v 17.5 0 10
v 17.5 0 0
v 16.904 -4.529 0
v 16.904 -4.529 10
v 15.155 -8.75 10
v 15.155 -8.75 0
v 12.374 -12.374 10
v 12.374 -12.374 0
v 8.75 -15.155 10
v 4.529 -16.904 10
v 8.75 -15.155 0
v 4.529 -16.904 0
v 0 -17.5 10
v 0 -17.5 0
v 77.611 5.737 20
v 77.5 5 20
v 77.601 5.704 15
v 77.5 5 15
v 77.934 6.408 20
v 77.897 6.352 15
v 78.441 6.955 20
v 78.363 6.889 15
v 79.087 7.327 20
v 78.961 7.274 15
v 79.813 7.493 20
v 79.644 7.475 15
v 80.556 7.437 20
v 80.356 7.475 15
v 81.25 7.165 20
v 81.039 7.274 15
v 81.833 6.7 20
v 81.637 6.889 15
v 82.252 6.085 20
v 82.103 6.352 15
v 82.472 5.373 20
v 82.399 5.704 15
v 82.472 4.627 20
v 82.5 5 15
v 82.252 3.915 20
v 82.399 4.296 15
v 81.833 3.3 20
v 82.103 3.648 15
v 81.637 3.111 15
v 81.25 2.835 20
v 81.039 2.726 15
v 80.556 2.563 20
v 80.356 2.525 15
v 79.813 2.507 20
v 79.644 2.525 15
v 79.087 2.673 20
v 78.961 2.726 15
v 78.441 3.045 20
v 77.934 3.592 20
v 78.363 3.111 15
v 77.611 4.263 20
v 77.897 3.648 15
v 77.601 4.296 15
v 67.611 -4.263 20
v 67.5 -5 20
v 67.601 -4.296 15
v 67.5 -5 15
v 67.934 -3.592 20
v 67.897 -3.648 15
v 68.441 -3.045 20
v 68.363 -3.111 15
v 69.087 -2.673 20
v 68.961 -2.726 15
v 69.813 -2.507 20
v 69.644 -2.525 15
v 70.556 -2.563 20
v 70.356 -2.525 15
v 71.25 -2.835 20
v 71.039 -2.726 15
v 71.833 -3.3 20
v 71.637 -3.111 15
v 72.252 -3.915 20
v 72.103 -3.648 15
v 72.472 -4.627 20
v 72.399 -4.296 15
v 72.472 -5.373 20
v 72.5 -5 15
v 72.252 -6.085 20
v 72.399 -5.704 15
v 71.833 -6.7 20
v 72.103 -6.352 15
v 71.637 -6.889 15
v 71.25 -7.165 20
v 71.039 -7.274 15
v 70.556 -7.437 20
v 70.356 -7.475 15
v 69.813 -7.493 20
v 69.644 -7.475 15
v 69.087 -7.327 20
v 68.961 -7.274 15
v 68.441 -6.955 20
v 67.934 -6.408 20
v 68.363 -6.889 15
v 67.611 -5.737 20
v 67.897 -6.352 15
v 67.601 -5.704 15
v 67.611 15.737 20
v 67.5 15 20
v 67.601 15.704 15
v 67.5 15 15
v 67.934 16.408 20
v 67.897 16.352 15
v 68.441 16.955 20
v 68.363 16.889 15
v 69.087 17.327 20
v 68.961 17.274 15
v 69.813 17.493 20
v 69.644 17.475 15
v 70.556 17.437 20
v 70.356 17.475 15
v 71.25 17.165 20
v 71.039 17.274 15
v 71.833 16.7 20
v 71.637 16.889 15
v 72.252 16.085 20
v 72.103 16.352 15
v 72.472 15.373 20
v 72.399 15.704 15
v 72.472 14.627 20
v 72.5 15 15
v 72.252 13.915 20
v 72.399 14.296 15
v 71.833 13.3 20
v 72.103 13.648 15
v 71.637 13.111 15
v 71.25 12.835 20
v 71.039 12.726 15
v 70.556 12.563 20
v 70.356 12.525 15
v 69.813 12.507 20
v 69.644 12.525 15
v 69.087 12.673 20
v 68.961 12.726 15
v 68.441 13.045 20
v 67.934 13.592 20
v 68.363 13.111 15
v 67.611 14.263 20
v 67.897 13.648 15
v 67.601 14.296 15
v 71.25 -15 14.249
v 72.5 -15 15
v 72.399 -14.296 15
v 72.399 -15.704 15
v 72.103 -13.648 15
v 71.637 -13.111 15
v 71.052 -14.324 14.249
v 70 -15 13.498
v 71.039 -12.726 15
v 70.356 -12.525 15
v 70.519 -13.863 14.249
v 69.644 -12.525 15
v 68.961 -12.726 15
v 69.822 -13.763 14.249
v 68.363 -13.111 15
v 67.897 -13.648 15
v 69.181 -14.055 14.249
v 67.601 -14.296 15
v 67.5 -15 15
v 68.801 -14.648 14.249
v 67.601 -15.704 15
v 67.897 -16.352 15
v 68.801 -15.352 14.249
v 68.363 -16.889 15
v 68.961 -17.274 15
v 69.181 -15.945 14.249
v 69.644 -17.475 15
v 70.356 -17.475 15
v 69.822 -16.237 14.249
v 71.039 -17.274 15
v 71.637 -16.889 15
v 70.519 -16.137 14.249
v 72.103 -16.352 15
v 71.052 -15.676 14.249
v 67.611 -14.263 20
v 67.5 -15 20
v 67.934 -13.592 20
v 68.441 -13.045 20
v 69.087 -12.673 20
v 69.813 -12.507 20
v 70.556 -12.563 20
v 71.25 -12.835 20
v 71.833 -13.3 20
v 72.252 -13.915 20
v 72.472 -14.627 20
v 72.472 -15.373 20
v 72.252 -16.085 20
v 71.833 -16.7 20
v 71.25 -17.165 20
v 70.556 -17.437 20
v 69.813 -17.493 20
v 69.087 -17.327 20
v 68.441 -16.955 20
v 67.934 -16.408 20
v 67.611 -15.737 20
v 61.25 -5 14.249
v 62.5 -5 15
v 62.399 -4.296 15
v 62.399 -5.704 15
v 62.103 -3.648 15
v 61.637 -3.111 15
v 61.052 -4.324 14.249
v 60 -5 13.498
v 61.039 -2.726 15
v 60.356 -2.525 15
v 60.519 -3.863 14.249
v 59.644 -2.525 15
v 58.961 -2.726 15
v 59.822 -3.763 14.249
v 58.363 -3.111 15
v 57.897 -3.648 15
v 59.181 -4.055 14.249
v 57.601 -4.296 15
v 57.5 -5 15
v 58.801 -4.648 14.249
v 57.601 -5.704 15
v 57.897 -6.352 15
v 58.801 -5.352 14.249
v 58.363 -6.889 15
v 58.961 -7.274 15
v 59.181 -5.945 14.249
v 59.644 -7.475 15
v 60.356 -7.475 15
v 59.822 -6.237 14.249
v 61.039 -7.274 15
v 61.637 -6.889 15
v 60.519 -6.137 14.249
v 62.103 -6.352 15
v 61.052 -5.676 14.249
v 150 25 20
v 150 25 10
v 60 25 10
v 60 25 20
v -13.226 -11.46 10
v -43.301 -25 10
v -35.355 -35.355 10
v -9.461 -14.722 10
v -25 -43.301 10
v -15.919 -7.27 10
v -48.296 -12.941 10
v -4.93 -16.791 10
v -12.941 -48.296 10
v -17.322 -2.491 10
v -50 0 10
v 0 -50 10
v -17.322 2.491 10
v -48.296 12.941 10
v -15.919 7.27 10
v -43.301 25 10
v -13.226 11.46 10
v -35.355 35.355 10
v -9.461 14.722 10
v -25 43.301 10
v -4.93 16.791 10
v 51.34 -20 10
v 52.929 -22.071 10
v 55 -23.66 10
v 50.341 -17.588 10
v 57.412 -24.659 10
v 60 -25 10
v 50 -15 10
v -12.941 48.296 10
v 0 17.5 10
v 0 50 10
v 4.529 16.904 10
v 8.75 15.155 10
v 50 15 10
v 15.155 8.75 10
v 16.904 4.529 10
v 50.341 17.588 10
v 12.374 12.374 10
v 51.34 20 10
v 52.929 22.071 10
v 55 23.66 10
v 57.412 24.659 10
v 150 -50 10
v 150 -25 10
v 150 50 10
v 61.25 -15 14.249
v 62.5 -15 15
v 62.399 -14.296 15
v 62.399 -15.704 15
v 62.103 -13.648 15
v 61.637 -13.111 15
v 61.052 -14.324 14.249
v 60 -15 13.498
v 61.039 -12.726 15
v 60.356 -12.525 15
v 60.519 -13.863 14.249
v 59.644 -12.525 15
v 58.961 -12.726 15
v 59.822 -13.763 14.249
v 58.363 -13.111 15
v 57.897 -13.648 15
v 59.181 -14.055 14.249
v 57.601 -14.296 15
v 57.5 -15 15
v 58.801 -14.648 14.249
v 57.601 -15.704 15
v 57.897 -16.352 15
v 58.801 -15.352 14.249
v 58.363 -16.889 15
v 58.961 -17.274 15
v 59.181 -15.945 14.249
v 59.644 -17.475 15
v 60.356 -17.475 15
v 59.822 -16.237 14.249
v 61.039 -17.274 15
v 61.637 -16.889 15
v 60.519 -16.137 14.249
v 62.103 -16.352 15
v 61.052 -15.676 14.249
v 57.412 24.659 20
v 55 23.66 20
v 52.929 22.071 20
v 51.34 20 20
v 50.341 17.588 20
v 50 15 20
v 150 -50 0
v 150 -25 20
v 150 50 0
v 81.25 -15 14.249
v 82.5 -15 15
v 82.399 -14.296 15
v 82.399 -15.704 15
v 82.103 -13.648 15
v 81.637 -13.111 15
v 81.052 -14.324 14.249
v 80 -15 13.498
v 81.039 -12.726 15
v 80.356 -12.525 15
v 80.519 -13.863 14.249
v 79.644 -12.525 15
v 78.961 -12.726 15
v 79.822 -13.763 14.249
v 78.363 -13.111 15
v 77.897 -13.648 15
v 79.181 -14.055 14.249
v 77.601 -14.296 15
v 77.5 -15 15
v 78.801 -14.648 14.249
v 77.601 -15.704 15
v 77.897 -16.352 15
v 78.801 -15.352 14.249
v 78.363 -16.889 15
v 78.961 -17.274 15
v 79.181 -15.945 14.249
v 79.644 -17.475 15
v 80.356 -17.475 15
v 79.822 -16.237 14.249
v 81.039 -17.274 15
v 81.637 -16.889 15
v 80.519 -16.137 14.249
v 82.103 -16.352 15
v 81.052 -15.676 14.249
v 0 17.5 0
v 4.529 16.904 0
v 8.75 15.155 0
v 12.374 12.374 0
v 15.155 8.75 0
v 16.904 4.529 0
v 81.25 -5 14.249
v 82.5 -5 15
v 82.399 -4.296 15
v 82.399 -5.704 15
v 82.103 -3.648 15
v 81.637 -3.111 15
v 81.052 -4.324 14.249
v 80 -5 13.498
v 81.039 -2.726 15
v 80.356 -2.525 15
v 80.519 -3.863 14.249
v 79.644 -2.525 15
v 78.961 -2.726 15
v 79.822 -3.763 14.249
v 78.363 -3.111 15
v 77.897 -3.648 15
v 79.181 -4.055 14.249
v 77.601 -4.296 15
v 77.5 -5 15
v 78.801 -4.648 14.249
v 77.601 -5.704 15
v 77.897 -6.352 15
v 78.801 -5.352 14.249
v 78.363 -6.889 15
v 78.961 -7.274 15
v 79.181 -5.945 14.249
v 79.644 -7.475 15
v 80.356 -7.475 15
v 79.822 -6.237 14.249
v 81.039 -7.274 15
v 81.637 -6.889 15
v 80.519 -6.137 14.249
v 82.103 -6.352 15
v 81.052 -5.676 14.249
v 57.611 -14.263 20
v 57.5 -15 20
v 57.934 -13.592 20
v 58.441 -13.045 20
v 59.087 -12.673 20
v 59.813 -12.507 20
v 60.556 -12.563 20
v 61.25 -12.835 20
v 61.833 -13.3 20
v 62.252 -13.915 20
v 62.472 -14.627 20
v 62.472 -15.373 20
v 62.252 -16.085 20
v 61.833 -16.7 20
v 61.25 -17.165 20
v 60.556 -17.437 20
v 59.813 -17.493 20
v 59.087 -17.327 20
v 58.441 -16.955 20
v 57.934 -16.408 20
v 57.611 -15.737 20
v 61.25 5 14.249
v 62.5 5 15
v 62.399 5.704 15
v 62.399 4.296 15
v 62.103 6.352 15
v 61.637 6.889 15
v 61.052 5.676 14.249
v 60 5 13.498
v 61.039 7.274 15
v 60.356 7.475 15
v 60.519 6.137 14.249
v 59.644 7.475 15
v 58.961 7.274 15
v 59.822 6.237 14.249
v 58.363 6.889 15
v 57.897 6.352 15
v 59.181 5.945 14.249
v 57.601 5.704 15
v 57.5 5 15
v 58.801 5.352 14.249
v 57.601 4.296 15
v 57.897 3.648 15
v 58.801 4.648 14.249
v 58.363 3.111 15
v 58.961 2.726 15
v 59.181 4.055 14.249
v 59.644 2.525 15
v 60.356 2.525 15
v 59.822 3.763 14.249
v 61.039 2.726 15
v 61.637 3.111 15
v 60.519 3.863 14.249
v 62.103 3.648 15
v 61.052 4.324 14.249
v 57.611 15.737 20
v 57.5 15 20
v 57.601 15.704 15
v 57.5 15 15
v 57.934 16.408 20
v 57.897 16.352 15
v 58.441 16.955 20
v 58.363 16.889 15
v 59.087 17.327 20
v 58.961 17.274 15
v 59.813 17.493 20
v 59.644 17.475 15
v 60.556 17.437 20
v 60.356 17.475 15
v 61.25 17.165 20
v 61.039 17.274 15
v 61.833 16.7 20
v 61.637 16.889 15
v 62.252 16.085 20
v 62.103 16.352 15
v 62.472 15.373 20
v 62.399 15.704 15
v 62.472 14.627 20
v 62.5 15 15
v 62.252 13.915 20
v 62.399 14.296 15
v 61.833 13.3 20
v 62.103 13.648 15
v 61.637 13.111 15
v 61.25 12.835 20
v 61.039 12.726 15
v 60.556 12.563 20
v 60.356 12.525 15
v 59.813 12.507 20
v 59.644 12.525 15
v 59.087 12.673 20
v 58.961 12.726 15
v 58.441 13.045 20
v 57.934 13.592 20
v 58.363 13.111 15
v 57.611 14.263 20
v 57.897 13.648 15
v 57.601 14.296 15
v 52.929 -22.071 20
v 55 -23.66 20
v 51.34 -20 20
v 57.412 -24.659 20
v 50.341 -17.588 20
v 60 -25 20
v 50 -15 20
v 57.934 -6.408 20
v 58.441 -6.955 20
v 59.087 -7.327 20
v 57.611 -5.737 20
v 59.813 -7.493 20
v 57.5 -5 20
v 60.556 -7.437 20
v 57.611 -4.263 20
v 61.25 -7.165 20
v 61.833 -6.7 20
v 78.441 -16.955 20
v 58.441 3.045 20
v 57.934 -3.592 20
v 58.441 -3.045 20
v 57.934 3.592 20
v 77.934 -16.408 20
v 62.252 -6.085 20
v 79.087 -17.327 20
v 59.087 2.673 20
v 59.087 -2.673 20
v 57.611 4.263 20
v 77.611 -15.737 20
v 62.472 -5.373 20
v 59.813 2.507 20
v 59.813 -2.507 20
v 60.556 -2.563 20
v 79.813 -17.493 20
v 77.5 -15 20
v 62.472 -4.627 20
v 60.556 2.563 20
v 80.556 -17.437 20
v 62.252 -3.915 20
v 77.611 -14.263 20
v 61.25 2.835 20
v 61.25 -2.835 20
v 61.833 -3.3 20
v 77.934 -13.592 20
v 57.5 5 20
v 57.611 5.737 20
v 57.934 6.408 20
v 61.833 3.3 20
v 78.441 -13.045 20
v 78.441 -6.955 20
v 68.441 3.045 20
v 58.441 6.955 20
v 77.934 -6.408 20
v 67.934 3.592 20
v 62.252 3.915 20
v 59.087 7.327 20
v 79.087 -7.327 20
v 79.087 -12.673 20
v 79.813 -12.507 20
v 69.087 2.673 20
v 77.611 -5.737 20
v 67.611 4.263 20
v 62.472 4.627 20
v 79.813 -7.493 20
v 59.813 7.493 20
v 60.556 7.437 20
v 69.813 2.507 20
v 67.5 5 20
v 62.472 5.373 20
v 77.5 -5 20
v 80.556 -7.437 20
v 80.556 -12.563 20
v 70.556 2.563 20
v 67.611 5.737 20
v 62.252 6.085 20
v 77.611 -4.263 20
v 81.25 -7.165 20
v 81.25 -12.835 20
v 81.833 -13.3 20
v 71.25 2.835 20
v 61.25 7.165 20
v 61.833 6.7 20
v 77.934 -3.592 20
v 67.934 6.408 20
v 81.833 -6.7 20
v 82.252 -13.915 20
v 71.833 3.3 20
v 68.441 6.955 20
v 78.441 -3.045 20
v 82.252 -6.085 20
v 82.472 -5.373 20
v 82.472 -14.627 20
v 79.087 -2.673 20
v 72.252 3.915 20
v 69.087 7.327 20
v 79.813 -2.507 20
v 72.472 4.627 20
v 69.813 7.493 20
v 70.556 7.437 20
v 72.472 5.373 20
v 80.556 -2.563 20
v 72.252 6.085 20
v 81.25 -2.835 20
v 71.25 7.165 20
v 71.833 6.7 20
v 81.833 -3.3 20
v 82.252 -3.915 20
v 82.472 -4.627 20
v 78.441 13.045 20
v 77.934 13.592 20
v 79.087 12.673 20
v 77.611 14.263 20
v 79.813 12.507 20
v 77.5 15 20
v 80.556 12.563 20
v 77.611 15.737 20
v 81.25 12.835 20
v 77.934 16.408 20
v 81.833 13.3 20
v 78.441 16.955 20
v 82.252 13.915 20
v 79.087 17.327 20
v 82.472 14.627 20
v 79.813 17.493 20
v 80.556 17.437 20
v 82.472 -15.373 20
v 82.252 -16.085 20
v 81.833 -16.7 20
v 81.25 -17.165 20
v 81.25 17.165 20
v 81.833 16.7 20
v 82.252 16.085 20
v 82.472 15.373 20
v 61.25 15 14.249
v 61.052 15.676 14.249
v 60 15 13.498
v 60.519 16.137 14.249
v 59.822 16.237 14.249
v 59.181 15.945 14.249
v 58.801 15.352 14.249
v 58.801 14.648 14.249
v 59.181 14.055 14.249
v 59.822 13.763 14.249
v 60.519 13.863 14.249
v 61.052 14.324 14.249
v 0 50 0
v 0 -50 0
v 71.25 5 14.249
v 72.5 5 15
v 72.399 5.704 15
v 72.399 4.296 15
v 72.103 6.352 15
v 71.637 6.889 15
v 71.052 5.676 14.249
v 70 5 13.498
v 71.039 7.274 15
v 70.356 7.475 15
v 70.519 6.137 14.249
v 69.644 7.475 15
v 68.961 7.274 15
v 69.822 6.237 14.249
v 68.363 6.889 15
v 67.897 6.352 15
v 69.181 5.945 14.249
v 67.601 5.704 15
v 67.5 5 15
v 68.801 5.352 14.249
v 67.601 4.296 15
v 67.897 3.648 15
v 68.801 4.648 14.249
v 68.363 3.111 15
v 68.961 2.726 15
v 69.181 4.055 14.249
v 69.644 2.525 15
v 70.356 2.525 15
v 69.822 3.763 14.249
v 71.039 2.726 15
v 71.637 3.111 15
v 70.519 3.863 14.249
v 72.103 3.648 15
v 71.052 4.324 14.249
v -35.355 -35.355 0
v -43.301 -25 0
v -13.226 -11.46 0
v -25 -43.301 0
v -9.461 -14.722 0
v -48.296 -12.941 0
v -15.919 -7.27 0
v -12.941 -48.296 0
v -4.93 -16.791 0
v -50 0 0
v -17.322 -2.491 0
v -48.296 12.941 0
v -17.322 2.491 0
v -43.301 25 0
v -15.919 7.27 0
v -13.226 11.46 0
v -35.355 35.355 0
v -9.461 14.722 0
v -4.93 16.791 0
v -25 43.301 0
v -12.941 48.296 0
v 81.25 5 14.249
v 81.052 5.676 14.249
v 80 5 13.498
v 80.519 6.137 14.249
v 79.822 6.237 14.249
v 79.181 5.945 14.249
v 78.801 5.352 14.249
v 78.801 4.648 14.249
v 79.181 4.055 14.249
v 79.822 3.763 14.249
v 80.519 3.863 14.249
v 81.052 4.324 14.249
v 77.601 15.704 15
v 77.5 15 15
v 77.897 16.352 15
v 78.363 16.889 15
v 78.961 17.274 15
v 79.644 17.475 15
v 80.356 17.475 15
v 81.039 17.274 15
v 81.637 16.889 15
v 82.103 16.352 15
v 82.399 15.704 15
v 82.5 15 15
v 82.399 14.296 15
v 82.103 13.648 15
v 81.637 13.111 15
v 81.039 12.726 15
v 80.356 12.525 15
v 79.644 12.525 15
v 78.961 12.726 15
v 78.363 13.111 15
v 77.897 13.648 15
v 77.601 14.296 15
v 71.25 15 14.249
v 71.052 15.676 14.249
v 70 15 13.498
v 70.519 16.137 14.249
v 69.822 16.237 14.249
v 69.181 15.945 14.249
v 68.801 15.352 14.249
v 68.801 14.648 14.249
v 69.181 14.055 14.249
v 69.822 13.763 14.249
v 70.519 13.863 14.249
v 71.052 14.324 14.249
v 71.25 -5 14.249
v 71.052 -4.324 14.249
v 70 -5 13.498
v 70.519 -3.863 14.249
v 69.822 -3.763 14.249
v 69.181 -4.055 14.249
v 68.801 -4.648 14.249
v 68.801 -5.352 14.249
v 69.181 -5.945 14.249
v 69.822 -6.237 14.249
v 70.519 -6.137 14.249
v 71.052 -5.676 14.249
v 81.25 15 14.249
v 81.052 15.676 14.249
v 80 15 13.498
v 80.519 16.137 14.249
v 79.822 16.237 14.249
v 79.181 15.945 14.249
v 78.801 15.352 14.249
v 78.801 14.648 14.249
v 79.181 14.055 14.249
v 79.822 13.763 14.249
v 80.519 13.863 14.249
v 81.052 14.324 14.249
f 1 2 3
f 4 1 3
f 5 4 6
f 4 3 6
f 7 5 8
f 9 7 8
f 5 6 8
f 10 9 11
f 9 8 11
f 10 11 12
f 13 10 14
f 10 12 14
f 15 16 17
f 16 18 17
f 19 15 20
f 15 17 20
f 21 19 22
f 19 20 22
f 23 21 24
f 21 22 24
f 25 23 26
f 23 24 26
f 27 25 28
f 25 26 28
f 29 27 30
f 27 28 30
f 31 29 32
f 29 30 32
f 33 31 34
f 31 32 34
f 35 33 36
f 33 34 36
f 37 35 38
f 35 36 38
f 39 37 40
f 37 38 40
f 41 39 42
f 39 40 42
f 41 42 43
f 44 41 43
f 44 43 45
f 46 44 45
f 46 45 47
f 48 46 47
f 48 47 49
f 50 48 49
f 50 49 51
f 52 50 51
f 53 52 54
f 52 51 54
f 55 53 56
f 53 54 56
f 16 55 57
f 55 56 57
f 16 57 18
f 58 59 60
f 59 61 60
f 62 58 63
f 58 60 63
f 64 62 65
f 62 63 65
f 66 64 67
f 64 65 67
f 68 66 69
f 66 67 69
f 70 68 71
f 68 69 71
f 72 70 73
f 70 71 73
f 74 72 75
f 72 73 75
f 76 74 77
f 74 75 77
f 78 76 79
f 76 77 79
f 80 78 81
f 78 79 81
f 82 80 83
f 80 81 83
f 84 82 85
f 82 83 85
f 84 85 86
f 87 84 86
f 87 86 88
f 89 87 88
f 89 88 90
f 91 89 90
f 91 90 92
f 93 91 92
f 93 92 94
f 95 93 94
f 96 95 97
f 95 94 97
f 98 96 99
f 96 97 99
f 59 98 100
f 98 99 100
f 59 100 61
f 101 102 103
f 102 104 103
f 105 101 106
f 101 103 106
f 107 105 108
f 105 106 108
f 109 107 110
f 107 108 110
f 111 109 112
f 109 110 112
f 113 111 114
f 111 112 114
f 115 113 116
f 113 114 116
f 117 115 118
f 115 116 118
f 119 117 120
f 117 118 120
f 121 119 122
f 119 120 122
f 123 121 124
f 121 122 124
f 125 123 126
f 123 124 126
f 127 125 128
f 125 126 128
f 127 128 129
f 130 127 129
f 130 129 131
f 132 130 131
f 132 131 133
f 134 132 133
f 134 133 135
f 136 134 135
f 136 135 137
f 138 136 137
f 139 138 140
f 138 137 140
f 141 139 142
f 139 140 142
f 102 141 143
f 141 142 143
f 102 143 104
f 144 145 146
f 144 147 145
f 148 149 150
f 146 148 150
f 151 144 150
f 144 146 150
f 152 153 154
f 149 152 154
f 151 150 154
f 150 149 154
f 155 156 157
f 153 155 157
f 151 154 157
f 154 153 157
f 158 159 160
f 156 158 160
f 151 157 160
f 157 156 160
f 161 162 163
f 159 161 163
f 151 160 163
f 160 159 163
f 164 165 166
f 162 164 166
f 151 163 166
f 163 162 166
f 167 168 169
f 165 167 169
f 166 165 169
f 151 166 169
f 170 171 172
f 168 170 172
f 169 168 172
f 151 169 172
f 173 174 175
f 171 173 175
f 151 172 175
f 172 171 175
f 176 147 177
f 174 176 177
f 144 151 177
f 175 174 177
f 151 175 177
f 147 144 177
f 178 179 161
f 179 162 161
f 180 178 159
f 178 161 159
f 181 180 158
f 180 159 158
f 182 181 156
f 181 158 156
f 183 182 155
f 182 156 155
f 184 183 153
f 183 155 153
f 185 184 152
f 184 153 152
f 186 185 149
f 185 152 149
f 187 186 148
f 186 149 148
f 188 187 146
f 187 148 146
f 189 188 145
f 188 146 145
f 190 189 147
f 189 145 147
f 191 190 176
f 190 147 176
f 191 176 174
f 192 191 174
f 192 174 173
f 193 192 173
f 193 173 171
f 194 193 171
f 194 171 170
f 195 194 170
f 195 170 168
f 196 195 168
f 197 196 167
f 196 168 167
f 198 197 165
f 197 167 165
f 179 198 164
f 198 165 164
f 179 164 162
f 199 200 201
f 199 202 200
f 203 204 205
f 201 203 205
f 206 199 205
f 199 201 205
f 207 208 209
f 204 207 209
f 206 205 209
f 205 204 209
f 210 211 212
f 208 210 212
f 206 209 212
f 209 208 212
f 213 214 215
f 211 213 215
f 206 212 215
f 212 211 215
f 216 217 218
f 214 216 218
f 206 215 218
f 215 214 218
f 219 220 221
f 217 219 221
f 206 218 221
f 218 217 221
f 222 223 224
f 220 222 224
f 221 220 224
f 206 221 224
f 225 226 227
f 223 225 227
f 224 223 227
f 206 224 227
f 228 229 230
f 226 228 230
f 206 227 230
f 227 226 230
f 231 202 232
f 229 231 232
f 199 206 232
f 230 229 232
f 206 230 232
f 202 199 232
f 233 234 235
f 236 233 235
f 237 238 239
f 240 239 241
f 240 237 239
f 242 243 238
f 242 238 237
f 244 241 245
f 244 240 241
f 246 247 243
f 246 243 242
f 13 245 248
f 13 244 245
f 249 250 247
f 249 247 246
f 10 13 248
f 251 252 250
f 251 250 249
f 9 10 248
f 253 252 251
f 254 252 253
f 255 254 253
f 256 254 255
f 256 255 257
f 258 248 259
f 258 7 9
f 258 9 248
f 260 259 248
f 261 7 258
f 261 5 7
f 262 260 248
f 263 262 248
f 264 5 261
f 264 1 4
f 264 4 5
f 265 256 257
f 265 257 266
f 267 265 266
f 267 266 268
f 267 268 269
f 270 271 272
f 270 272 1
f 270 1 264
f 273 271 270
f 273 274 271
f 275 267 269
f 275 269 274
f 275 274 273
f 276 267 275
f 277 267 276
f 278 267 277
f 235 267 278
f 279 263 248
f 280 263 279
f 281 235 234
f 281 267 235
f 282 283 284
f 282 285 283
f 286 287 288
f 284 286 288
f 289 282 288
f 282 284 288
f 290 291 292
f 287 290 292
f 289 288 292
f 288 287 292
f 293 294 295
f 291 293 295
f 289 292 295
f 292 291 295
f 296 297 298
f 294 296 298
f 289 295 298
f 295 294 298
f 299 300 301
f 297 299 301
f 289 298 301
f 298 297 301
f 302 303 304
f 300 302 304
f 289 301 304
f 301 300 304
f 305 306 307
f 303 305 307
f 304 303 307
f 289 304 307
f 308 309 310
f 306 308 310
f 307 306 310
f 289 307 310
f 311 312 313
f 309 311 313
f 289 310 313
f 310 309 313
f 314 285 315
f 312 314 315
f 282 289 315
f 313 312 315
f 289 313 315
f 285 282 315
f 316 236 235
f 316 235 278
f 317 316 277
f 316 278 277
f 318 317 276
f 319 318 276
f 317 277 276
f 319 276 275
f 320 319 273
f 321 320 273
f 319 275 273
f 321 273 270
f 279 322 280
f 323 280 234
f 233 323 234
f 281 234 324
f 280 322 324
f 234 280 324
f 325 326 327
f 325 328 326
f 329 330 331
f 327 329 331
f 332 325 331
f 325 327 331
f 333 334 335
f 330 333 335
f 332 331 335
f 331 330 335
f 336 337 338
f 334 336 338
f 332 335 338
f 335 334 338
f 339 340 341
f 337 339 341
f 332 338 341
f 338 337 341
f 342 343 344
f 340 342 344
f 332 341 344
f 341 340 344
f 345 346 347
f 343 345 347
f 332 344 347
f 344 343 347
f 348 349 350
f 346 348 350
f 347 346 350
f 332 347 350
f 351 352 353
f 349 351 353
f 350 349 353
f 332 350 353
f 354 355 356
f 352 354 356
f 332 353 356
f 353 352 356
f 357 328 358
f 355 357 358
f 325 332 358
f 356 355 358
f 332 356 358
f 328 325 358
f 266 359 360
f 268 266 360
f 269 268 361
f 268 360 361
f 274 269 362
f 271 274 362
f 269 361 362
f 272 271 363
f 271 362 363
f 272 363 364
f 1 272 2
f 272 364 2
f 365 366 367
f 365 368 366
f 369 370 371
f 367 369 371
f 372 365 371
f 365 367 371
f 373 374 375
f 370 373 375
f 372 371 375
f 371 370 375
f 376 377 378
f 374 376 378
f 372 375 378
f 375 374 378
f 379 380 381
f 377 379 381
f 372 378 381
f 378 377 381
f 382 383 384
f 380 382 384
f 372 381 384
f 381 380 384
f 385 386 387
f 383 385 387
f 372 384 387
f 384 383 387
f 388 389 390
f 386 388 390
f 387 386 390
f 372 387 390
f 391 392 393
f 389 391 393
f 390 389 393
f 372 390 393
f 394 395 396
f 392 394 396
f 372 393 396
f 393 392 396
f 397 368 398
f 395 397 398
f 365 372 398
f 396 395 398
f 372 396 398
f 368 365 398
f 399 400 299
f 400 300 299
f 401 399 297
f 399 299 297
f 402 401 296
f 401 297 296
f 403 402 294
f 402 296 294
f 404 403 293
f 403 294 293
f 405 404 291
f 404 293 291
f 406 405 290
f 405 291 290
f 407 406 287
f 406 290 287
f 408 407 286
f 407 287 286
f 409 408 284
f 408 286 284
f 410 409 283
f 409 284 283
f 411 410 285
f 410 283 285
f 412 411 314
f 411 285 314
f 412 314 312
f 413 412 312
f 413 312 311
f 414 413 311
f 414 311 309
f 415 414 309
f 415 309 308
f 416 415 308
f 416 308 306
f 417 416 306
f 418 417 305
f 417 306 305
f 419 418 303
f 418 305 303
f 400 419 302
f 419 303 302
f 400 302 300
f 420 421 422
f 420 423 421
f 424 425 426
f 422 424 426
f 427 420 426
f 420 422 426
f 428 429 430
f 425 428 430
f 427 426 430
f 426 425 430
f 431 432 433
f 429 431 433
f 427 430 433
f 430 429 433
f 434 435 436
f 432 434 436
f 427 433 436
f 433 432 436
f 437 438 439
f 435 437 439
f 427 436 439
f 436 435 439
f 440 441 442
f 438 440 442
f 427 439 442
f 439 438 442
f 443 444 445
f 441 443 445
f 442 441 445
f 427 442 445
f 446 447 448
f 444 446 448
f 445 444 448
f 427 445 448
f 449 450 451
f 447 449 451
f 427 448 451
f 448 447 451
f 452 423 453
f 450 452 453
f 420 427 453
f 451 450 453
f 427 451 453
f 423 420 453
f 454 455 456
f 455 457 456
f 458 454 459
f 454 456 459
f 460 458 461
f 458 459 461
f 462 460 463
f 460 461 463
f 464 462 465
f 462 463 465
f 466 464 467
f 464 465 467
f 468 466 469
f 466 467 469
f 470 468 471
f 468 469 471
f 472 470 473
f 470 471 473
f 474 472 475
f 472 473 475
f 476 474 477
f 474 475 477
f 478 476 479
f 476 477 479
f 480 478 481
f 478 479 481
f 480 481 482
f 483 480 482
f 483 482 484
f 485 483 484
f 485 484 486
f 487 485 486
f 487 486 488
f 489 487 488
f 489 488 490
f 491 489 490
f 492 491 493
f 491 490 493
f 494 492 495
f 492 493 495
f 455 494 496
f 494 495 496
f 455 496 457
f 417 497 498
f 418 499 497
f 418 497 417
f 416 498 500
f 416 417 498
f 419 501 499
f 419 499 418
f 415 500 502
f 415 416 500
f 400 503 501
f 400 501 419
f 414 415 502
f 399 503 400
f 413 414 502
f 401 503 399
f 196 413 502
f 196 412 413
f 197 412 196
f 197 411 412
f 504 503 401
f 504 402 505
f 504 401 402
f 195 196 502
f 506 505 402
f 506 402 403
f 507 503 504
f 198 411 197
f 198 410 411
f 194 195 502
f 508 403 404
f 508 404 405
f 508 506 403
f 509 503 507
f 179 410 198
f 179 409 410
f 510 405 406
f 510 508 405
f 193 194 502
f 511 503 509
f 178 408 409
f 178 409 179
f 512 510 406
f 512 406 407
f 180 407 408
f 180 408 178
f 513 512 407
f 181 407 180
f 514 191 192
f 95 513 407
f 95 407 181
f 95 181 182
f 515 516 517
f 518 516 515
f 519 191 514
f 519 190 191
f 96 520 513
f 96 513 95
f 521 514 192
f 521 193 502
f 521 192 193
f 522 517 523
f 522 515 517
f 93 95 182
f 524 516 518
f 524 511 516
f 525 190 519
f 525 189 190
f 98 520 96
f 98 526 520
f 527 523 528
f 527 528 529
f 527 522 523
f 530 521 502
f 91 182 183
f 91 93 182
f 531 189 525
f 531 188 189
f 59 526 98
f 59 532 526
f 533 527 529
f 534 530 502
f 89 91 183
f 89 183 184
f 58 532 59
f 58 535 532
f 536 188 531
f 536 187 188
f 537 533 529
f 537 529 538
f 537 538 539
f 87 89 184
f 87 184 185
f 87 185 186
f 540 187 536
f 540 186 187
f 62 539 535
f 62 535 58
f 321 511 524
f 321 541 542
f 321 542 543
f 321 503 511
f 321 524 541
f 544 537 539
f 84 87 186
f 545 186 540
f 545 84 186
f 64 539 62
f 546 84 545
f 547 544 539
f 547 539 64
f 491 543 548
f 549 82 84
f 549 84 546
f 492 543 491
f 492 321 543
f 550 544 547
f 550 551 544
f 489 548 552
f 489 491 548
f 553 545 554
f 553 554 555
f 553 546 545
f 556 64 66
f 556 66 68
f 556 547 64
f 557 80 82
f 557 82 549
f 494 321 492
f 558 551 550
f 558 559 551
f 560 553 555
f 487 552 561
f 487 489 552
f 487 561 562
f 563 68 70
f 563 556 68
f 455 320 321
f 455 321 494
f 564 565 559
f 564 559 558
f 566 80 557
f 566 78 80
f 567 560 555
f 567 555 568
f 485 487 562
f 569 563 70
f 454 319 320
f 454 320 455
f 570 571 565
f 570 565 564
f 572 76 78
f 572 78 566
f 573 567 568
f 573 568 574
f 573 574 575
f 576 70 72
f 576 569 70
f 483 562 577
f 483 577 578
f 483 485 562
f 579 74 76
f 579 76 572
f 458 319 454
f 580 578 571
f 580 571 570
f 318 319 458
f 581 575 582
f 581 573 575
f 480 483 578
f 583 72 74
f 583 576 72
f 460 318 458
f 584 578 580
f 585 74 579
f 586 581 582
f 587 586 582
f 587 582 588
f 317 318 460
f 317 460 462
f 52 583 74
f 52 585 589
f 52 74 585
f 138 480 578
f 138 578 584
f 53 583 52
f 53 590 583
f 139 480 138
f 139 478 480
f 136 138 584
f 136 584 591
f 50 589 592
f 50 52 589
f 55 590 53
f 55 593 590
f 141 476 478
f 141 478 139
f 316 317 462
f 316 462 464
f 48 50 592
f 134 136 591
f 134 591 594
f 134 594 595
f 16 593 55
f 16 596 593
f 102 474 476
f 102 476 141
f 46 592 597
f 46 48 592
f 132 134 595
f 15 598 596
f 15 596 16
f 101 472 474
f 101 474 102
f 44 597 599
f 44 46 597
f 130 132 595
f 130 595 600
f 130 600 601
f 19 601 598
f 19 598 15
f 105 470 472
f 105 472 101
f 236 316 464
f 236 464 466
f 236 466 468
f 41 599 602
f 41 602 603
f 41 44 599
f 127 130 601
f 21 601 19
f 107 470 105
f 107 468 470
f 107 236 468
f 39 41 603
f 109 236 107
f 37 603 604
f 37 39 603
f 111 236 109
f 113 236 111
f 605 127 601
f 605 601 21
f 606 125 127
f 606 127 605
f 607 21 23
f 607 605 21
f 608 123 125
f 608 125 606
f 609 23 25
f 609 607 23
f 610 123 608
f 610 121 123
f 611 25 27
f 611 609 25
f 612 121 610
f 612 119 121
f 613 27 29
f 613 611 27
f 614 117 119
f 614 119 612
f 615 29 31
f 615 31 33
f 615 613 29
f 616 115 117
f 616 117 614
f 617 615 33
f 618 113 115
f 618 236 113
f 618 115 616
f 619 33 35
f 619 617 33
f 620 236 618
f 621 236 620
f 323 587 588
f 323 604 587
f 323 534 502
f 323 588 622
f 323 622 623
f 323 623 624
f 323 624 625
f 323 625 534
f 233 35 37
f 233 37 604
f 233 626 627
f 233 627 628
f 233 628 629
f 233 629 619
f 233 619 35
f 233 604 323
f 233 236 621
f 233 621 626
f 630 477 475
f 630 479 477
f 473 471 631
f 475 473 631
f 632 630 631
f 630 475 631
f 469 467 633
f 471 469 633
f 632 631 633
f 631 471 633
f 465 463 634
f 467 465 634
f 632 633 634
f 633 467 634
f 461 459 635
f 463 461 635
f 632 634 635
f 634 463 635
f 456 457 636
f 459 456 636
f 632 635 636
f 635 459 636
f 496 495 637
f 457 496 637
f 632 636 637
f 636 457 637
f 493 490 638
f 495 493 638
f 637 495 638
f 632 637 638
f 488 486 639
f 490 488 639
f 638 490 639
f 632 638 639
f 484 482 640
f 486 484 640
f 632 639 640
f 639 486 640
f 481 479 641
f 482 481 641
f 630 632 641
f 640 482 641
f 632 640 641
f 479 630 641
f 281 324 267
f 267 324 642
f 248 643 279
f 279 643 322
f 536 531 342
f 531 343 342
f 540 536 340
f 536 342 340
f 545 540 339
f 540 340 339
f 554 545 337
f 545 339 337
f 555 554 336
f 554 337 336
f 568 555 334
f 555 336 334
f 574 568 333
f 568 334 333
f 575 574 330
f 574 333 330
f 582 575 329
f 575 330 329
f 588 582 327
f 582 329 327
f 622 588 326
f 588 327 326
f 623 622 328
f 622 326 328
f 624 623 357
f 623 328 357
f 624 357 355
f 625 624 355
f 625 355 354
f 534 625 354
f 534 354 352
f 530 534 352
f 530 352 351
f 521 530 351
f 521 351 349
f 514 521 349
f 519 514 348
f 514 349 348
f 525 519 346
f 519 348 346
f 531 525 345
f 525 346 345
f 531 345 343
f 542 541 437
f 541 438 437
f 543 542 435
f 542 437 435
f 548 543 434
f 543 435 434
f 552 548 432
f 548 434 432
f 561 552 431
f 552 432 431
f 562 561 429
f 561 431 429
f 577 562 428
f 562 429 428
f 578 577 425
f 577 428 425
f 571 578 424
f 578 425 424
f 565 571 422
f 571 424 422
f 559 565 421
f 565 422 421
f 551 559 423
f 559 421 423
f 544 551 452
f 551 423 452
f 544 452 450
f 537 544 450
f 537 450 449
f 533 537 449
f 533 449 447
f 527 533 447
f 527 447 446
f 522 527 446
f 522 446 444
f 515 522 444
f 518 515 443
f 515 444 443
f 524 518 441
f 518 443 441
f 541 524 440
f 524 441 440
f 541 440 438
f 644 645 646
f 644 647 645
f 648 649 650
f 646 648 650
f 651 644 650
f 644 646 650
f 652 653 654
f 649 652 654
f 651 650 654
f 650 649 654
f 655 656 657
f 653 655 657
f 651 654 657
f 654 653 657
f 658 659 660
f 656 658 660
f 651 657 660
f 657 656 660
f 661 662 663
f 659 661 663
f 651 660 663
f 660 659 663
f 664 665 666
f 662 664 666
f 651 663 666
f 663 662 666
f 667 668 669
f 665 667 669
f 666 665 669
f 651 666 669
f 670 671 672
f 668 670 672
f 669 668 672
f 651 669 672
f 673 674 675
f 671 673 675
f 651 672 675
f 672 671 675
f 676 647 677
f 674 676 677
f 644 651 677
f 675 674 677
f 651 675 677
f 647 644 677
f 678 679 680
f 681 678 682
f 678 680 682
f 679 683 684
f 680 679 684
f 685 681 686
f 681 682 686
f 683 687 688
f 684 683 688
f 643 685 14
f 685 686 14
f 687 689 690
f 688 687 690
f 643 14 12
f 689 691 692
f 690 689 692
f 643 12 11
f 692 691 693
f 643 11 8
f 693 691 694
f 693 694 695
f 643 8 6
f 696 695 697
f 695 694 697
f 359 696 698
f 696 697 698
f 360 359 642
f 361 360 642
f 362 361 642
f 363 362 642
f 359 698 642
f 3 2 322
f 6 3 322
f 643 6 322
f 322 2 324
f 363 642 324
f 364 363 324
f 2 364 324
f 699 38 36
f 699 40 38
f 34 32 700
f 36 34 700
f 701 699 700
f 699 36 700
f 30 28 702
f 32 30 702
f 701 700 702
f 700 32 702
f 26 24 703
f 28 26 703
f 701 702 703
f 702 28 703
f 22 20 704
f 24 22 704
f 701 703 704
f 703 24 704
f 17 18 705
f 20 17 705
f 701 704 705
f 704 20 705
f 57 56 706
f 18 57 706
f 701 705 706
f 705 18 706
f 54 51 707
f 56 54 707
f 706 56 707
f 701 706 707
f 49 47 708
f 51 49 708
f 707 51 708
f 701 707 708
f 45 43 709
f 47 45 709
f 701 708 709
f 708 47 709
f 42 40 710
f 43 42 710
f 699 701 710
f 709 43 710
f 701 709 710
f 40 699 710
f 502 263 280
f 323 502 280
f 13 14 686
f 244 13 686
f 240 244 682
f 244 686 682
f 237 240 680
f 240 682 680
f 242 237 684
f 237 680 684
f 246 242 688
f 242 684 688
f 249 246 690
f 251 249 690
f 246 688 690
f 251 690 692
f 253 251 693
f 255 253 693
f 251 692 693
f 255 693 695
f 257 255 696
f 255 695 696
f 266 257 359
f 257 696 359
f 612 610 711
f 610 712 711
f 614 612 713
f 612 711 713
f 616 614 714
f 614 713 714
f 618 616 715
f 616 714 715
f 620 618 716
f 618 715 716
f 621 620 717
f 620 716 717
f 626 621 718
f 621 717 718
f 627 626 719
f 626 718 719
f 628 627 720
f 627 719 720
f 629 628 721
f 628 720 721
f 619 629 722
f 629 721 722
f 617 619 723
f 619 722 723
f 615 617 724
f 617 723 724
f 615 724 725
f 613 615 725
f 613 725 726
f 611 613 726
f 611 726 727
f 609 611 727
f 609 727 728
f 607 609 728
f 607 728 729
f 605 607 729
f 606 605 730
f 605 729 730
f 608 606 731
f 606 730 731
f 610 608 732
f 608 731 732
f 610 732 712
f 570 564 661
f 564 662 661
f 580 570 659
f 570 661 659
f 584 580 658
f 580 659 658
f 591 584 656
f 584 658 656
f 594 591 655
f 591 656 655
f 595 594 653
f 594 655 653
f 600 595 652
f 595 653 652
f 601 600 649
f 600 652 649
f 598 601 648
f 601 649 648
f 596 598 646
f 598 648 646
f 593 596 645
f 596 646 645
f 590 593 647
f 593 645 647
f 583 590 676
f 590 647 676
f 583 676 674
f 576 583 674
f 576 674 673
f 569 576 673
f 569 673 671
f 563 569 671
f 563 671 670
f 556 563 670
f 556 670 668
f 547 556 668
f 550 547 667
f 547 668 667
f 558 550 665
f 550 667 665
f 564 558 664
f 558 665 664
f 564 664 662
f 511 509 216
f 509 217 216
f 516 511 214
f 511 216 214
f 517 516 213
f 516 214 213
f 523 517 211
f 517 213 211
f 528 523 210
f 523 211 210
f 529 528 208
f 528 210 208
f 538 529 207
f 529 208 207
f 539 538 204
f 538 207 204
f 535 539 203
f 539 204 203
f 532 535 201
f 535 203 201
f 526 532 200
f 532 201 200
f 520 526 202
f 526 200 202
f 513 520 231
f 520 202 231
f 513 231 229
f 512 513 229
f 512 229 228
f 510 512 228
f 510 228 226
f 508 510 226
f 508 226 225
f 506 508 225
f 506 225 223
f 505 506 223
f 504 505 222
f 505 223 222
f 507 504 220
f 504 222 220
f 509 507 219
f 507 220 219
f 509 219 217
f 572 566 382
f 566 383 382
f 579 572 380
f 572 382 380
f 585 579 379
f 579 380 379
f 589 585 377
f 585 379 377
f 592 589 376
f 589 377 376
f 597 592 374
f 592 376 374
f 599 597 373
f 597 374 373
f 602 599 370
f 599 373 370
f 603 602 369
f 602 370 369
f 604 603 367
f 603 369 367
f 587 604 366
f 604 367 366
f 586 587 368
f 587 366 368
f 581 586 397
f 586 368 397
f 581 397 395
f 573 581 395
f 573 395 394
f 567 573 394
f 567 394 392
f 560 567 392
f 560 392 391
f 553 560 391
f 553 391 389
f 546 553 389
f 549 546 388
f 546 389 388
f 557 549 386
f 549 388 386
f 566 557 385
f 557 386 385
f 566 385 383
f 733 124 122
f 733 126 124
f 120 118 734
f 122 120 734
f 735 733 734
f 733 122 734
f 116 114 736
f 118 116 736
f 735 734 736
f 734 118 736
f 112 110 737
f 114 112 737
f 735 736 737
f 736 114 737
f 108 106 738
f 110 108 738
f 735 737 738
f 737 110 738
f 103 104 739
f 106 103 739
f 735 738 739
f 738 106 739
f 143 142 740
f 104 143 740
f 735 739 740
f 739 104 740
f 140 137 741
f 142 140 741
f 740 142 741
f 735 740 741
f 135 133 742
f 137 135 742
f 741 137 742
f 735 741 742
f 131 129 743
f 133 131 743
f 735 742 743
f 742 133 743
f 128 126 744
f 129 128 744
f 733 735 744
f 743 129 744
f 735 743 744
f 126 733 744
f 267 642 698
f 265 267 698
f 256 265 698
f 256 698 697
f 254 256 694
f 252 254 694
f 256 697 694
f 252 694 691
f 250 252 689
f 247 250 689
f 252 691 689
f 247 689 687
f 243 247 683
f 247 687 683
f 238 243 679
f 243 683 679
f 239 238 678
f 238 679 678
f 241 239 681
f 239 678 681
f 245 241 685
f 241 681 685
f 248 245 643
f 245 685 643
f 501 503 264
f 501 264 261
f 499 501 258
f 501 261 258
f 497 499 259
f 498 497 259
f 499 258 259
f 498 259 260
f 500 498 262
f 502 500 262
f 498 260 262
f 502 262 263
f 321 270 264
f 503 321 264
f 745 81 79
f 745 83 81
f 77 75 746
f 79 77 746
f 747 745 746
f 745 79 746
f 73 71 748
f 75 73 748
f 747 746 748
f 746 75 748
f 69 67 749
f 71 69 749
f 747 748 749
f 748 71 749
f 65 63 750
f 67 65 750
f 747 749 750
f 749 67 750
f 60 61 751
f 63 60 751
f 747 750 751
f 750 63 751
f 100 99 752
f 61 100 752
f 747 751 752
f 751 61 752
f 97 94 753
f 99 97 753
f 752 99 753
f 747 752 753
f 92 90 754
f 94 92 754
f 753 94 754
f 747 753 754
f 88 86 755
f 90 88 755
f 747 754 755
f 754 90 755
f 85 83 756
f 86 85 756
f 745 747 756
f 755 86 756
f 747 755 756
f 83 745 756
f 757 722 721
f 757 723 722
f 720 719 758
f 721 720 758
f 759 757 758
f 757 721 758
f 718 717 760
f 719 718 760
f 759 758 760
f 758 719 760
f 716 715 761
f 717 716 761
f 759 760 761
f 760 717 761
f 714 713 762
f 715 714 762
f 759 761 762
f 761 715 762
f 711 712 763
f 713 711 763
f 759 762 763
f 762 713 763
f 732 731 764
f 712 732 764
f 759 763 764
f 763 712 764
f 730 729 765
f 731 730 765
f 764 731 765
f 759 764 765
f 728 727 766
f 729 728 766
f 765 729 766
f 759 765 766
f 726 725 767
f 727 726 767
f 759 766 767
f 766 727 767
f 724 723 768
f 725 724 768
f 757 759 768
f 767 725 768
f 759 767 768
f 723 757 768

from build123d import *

# Parameters (mm, degrees)
F1_DEPTH = 10
F3_DEPTH = 10
F5_D     = 5
F5_DEPTH = 5
F5_TIP   = 1.5021515476


with BuildPart() as f1:
    # F0 (on Top) → F1 (new body)
    with BuildSketch(Plane.XY):
        with BuildLine():
            ThreePointArc((0, 17.5), (12.3743686708, 12.3743686708), (17.5, 0))
            ThreePointArc((17.5, 0), (12.3743686708, -12.3743686708), (0, -17.5))
            Line((0, -17.5), (0, -50))
            Line((0, -50), (150, -50))
            Line((150, -50), (150, 50))
            Line((150, 50), (0, 50))
            Line((0, 50), (0, 17.5))
        make_face()
        with BuildLine():
            ThreePointArc((0, -17.5), (-17.5, 0), (0, 17.5))
            Line((0, 17.5), (0, 50))
            ThreePointArc((0, 50), (-50, 0), (0, -50))
            Line((0, -50), (0, -17.5))
        make_face()
    extrude(amount=F1_DEPTH)

    # F2 (on face) → F3 (join)
    with BuildSketch(Plane.XY.offset(10)):
        with BuildLine():
            Line((150, -25), (150, 25))
            Line((150, 25), (60, 25))
            ThreePointArc((60, 25), (52.9289321881, 22.0710678119), (50, 15))
            Line((50, 15), (50, -15))
            ThreePointArc((50, -15), (52.9289321881, -22.0710678119), (60, -25))
            Line((60, -25), (150, -25))
        make_face()
    extrude(amount=F3_DEPTH)

    # F5
    with Locations(Plane.XY.offset(20)):
        with Locations((60, 15), (70, 15), (80, 15), (60, 5), (70, 5), (80, 5), (60, -5), (70, -5), (80, -5), (60, -15), (70, -15), (80, -15)):
            Hole(F5_D / 2, depth=F5_DEPTH)
            with Locations((0, 0, -(F5_DEPTH + F5_TIP / 2))):  # 118° drill point
                Cone(0, F5_D / 2, F5_TIP, mode=Mode.SUBTRACT)


solid = f1.part
